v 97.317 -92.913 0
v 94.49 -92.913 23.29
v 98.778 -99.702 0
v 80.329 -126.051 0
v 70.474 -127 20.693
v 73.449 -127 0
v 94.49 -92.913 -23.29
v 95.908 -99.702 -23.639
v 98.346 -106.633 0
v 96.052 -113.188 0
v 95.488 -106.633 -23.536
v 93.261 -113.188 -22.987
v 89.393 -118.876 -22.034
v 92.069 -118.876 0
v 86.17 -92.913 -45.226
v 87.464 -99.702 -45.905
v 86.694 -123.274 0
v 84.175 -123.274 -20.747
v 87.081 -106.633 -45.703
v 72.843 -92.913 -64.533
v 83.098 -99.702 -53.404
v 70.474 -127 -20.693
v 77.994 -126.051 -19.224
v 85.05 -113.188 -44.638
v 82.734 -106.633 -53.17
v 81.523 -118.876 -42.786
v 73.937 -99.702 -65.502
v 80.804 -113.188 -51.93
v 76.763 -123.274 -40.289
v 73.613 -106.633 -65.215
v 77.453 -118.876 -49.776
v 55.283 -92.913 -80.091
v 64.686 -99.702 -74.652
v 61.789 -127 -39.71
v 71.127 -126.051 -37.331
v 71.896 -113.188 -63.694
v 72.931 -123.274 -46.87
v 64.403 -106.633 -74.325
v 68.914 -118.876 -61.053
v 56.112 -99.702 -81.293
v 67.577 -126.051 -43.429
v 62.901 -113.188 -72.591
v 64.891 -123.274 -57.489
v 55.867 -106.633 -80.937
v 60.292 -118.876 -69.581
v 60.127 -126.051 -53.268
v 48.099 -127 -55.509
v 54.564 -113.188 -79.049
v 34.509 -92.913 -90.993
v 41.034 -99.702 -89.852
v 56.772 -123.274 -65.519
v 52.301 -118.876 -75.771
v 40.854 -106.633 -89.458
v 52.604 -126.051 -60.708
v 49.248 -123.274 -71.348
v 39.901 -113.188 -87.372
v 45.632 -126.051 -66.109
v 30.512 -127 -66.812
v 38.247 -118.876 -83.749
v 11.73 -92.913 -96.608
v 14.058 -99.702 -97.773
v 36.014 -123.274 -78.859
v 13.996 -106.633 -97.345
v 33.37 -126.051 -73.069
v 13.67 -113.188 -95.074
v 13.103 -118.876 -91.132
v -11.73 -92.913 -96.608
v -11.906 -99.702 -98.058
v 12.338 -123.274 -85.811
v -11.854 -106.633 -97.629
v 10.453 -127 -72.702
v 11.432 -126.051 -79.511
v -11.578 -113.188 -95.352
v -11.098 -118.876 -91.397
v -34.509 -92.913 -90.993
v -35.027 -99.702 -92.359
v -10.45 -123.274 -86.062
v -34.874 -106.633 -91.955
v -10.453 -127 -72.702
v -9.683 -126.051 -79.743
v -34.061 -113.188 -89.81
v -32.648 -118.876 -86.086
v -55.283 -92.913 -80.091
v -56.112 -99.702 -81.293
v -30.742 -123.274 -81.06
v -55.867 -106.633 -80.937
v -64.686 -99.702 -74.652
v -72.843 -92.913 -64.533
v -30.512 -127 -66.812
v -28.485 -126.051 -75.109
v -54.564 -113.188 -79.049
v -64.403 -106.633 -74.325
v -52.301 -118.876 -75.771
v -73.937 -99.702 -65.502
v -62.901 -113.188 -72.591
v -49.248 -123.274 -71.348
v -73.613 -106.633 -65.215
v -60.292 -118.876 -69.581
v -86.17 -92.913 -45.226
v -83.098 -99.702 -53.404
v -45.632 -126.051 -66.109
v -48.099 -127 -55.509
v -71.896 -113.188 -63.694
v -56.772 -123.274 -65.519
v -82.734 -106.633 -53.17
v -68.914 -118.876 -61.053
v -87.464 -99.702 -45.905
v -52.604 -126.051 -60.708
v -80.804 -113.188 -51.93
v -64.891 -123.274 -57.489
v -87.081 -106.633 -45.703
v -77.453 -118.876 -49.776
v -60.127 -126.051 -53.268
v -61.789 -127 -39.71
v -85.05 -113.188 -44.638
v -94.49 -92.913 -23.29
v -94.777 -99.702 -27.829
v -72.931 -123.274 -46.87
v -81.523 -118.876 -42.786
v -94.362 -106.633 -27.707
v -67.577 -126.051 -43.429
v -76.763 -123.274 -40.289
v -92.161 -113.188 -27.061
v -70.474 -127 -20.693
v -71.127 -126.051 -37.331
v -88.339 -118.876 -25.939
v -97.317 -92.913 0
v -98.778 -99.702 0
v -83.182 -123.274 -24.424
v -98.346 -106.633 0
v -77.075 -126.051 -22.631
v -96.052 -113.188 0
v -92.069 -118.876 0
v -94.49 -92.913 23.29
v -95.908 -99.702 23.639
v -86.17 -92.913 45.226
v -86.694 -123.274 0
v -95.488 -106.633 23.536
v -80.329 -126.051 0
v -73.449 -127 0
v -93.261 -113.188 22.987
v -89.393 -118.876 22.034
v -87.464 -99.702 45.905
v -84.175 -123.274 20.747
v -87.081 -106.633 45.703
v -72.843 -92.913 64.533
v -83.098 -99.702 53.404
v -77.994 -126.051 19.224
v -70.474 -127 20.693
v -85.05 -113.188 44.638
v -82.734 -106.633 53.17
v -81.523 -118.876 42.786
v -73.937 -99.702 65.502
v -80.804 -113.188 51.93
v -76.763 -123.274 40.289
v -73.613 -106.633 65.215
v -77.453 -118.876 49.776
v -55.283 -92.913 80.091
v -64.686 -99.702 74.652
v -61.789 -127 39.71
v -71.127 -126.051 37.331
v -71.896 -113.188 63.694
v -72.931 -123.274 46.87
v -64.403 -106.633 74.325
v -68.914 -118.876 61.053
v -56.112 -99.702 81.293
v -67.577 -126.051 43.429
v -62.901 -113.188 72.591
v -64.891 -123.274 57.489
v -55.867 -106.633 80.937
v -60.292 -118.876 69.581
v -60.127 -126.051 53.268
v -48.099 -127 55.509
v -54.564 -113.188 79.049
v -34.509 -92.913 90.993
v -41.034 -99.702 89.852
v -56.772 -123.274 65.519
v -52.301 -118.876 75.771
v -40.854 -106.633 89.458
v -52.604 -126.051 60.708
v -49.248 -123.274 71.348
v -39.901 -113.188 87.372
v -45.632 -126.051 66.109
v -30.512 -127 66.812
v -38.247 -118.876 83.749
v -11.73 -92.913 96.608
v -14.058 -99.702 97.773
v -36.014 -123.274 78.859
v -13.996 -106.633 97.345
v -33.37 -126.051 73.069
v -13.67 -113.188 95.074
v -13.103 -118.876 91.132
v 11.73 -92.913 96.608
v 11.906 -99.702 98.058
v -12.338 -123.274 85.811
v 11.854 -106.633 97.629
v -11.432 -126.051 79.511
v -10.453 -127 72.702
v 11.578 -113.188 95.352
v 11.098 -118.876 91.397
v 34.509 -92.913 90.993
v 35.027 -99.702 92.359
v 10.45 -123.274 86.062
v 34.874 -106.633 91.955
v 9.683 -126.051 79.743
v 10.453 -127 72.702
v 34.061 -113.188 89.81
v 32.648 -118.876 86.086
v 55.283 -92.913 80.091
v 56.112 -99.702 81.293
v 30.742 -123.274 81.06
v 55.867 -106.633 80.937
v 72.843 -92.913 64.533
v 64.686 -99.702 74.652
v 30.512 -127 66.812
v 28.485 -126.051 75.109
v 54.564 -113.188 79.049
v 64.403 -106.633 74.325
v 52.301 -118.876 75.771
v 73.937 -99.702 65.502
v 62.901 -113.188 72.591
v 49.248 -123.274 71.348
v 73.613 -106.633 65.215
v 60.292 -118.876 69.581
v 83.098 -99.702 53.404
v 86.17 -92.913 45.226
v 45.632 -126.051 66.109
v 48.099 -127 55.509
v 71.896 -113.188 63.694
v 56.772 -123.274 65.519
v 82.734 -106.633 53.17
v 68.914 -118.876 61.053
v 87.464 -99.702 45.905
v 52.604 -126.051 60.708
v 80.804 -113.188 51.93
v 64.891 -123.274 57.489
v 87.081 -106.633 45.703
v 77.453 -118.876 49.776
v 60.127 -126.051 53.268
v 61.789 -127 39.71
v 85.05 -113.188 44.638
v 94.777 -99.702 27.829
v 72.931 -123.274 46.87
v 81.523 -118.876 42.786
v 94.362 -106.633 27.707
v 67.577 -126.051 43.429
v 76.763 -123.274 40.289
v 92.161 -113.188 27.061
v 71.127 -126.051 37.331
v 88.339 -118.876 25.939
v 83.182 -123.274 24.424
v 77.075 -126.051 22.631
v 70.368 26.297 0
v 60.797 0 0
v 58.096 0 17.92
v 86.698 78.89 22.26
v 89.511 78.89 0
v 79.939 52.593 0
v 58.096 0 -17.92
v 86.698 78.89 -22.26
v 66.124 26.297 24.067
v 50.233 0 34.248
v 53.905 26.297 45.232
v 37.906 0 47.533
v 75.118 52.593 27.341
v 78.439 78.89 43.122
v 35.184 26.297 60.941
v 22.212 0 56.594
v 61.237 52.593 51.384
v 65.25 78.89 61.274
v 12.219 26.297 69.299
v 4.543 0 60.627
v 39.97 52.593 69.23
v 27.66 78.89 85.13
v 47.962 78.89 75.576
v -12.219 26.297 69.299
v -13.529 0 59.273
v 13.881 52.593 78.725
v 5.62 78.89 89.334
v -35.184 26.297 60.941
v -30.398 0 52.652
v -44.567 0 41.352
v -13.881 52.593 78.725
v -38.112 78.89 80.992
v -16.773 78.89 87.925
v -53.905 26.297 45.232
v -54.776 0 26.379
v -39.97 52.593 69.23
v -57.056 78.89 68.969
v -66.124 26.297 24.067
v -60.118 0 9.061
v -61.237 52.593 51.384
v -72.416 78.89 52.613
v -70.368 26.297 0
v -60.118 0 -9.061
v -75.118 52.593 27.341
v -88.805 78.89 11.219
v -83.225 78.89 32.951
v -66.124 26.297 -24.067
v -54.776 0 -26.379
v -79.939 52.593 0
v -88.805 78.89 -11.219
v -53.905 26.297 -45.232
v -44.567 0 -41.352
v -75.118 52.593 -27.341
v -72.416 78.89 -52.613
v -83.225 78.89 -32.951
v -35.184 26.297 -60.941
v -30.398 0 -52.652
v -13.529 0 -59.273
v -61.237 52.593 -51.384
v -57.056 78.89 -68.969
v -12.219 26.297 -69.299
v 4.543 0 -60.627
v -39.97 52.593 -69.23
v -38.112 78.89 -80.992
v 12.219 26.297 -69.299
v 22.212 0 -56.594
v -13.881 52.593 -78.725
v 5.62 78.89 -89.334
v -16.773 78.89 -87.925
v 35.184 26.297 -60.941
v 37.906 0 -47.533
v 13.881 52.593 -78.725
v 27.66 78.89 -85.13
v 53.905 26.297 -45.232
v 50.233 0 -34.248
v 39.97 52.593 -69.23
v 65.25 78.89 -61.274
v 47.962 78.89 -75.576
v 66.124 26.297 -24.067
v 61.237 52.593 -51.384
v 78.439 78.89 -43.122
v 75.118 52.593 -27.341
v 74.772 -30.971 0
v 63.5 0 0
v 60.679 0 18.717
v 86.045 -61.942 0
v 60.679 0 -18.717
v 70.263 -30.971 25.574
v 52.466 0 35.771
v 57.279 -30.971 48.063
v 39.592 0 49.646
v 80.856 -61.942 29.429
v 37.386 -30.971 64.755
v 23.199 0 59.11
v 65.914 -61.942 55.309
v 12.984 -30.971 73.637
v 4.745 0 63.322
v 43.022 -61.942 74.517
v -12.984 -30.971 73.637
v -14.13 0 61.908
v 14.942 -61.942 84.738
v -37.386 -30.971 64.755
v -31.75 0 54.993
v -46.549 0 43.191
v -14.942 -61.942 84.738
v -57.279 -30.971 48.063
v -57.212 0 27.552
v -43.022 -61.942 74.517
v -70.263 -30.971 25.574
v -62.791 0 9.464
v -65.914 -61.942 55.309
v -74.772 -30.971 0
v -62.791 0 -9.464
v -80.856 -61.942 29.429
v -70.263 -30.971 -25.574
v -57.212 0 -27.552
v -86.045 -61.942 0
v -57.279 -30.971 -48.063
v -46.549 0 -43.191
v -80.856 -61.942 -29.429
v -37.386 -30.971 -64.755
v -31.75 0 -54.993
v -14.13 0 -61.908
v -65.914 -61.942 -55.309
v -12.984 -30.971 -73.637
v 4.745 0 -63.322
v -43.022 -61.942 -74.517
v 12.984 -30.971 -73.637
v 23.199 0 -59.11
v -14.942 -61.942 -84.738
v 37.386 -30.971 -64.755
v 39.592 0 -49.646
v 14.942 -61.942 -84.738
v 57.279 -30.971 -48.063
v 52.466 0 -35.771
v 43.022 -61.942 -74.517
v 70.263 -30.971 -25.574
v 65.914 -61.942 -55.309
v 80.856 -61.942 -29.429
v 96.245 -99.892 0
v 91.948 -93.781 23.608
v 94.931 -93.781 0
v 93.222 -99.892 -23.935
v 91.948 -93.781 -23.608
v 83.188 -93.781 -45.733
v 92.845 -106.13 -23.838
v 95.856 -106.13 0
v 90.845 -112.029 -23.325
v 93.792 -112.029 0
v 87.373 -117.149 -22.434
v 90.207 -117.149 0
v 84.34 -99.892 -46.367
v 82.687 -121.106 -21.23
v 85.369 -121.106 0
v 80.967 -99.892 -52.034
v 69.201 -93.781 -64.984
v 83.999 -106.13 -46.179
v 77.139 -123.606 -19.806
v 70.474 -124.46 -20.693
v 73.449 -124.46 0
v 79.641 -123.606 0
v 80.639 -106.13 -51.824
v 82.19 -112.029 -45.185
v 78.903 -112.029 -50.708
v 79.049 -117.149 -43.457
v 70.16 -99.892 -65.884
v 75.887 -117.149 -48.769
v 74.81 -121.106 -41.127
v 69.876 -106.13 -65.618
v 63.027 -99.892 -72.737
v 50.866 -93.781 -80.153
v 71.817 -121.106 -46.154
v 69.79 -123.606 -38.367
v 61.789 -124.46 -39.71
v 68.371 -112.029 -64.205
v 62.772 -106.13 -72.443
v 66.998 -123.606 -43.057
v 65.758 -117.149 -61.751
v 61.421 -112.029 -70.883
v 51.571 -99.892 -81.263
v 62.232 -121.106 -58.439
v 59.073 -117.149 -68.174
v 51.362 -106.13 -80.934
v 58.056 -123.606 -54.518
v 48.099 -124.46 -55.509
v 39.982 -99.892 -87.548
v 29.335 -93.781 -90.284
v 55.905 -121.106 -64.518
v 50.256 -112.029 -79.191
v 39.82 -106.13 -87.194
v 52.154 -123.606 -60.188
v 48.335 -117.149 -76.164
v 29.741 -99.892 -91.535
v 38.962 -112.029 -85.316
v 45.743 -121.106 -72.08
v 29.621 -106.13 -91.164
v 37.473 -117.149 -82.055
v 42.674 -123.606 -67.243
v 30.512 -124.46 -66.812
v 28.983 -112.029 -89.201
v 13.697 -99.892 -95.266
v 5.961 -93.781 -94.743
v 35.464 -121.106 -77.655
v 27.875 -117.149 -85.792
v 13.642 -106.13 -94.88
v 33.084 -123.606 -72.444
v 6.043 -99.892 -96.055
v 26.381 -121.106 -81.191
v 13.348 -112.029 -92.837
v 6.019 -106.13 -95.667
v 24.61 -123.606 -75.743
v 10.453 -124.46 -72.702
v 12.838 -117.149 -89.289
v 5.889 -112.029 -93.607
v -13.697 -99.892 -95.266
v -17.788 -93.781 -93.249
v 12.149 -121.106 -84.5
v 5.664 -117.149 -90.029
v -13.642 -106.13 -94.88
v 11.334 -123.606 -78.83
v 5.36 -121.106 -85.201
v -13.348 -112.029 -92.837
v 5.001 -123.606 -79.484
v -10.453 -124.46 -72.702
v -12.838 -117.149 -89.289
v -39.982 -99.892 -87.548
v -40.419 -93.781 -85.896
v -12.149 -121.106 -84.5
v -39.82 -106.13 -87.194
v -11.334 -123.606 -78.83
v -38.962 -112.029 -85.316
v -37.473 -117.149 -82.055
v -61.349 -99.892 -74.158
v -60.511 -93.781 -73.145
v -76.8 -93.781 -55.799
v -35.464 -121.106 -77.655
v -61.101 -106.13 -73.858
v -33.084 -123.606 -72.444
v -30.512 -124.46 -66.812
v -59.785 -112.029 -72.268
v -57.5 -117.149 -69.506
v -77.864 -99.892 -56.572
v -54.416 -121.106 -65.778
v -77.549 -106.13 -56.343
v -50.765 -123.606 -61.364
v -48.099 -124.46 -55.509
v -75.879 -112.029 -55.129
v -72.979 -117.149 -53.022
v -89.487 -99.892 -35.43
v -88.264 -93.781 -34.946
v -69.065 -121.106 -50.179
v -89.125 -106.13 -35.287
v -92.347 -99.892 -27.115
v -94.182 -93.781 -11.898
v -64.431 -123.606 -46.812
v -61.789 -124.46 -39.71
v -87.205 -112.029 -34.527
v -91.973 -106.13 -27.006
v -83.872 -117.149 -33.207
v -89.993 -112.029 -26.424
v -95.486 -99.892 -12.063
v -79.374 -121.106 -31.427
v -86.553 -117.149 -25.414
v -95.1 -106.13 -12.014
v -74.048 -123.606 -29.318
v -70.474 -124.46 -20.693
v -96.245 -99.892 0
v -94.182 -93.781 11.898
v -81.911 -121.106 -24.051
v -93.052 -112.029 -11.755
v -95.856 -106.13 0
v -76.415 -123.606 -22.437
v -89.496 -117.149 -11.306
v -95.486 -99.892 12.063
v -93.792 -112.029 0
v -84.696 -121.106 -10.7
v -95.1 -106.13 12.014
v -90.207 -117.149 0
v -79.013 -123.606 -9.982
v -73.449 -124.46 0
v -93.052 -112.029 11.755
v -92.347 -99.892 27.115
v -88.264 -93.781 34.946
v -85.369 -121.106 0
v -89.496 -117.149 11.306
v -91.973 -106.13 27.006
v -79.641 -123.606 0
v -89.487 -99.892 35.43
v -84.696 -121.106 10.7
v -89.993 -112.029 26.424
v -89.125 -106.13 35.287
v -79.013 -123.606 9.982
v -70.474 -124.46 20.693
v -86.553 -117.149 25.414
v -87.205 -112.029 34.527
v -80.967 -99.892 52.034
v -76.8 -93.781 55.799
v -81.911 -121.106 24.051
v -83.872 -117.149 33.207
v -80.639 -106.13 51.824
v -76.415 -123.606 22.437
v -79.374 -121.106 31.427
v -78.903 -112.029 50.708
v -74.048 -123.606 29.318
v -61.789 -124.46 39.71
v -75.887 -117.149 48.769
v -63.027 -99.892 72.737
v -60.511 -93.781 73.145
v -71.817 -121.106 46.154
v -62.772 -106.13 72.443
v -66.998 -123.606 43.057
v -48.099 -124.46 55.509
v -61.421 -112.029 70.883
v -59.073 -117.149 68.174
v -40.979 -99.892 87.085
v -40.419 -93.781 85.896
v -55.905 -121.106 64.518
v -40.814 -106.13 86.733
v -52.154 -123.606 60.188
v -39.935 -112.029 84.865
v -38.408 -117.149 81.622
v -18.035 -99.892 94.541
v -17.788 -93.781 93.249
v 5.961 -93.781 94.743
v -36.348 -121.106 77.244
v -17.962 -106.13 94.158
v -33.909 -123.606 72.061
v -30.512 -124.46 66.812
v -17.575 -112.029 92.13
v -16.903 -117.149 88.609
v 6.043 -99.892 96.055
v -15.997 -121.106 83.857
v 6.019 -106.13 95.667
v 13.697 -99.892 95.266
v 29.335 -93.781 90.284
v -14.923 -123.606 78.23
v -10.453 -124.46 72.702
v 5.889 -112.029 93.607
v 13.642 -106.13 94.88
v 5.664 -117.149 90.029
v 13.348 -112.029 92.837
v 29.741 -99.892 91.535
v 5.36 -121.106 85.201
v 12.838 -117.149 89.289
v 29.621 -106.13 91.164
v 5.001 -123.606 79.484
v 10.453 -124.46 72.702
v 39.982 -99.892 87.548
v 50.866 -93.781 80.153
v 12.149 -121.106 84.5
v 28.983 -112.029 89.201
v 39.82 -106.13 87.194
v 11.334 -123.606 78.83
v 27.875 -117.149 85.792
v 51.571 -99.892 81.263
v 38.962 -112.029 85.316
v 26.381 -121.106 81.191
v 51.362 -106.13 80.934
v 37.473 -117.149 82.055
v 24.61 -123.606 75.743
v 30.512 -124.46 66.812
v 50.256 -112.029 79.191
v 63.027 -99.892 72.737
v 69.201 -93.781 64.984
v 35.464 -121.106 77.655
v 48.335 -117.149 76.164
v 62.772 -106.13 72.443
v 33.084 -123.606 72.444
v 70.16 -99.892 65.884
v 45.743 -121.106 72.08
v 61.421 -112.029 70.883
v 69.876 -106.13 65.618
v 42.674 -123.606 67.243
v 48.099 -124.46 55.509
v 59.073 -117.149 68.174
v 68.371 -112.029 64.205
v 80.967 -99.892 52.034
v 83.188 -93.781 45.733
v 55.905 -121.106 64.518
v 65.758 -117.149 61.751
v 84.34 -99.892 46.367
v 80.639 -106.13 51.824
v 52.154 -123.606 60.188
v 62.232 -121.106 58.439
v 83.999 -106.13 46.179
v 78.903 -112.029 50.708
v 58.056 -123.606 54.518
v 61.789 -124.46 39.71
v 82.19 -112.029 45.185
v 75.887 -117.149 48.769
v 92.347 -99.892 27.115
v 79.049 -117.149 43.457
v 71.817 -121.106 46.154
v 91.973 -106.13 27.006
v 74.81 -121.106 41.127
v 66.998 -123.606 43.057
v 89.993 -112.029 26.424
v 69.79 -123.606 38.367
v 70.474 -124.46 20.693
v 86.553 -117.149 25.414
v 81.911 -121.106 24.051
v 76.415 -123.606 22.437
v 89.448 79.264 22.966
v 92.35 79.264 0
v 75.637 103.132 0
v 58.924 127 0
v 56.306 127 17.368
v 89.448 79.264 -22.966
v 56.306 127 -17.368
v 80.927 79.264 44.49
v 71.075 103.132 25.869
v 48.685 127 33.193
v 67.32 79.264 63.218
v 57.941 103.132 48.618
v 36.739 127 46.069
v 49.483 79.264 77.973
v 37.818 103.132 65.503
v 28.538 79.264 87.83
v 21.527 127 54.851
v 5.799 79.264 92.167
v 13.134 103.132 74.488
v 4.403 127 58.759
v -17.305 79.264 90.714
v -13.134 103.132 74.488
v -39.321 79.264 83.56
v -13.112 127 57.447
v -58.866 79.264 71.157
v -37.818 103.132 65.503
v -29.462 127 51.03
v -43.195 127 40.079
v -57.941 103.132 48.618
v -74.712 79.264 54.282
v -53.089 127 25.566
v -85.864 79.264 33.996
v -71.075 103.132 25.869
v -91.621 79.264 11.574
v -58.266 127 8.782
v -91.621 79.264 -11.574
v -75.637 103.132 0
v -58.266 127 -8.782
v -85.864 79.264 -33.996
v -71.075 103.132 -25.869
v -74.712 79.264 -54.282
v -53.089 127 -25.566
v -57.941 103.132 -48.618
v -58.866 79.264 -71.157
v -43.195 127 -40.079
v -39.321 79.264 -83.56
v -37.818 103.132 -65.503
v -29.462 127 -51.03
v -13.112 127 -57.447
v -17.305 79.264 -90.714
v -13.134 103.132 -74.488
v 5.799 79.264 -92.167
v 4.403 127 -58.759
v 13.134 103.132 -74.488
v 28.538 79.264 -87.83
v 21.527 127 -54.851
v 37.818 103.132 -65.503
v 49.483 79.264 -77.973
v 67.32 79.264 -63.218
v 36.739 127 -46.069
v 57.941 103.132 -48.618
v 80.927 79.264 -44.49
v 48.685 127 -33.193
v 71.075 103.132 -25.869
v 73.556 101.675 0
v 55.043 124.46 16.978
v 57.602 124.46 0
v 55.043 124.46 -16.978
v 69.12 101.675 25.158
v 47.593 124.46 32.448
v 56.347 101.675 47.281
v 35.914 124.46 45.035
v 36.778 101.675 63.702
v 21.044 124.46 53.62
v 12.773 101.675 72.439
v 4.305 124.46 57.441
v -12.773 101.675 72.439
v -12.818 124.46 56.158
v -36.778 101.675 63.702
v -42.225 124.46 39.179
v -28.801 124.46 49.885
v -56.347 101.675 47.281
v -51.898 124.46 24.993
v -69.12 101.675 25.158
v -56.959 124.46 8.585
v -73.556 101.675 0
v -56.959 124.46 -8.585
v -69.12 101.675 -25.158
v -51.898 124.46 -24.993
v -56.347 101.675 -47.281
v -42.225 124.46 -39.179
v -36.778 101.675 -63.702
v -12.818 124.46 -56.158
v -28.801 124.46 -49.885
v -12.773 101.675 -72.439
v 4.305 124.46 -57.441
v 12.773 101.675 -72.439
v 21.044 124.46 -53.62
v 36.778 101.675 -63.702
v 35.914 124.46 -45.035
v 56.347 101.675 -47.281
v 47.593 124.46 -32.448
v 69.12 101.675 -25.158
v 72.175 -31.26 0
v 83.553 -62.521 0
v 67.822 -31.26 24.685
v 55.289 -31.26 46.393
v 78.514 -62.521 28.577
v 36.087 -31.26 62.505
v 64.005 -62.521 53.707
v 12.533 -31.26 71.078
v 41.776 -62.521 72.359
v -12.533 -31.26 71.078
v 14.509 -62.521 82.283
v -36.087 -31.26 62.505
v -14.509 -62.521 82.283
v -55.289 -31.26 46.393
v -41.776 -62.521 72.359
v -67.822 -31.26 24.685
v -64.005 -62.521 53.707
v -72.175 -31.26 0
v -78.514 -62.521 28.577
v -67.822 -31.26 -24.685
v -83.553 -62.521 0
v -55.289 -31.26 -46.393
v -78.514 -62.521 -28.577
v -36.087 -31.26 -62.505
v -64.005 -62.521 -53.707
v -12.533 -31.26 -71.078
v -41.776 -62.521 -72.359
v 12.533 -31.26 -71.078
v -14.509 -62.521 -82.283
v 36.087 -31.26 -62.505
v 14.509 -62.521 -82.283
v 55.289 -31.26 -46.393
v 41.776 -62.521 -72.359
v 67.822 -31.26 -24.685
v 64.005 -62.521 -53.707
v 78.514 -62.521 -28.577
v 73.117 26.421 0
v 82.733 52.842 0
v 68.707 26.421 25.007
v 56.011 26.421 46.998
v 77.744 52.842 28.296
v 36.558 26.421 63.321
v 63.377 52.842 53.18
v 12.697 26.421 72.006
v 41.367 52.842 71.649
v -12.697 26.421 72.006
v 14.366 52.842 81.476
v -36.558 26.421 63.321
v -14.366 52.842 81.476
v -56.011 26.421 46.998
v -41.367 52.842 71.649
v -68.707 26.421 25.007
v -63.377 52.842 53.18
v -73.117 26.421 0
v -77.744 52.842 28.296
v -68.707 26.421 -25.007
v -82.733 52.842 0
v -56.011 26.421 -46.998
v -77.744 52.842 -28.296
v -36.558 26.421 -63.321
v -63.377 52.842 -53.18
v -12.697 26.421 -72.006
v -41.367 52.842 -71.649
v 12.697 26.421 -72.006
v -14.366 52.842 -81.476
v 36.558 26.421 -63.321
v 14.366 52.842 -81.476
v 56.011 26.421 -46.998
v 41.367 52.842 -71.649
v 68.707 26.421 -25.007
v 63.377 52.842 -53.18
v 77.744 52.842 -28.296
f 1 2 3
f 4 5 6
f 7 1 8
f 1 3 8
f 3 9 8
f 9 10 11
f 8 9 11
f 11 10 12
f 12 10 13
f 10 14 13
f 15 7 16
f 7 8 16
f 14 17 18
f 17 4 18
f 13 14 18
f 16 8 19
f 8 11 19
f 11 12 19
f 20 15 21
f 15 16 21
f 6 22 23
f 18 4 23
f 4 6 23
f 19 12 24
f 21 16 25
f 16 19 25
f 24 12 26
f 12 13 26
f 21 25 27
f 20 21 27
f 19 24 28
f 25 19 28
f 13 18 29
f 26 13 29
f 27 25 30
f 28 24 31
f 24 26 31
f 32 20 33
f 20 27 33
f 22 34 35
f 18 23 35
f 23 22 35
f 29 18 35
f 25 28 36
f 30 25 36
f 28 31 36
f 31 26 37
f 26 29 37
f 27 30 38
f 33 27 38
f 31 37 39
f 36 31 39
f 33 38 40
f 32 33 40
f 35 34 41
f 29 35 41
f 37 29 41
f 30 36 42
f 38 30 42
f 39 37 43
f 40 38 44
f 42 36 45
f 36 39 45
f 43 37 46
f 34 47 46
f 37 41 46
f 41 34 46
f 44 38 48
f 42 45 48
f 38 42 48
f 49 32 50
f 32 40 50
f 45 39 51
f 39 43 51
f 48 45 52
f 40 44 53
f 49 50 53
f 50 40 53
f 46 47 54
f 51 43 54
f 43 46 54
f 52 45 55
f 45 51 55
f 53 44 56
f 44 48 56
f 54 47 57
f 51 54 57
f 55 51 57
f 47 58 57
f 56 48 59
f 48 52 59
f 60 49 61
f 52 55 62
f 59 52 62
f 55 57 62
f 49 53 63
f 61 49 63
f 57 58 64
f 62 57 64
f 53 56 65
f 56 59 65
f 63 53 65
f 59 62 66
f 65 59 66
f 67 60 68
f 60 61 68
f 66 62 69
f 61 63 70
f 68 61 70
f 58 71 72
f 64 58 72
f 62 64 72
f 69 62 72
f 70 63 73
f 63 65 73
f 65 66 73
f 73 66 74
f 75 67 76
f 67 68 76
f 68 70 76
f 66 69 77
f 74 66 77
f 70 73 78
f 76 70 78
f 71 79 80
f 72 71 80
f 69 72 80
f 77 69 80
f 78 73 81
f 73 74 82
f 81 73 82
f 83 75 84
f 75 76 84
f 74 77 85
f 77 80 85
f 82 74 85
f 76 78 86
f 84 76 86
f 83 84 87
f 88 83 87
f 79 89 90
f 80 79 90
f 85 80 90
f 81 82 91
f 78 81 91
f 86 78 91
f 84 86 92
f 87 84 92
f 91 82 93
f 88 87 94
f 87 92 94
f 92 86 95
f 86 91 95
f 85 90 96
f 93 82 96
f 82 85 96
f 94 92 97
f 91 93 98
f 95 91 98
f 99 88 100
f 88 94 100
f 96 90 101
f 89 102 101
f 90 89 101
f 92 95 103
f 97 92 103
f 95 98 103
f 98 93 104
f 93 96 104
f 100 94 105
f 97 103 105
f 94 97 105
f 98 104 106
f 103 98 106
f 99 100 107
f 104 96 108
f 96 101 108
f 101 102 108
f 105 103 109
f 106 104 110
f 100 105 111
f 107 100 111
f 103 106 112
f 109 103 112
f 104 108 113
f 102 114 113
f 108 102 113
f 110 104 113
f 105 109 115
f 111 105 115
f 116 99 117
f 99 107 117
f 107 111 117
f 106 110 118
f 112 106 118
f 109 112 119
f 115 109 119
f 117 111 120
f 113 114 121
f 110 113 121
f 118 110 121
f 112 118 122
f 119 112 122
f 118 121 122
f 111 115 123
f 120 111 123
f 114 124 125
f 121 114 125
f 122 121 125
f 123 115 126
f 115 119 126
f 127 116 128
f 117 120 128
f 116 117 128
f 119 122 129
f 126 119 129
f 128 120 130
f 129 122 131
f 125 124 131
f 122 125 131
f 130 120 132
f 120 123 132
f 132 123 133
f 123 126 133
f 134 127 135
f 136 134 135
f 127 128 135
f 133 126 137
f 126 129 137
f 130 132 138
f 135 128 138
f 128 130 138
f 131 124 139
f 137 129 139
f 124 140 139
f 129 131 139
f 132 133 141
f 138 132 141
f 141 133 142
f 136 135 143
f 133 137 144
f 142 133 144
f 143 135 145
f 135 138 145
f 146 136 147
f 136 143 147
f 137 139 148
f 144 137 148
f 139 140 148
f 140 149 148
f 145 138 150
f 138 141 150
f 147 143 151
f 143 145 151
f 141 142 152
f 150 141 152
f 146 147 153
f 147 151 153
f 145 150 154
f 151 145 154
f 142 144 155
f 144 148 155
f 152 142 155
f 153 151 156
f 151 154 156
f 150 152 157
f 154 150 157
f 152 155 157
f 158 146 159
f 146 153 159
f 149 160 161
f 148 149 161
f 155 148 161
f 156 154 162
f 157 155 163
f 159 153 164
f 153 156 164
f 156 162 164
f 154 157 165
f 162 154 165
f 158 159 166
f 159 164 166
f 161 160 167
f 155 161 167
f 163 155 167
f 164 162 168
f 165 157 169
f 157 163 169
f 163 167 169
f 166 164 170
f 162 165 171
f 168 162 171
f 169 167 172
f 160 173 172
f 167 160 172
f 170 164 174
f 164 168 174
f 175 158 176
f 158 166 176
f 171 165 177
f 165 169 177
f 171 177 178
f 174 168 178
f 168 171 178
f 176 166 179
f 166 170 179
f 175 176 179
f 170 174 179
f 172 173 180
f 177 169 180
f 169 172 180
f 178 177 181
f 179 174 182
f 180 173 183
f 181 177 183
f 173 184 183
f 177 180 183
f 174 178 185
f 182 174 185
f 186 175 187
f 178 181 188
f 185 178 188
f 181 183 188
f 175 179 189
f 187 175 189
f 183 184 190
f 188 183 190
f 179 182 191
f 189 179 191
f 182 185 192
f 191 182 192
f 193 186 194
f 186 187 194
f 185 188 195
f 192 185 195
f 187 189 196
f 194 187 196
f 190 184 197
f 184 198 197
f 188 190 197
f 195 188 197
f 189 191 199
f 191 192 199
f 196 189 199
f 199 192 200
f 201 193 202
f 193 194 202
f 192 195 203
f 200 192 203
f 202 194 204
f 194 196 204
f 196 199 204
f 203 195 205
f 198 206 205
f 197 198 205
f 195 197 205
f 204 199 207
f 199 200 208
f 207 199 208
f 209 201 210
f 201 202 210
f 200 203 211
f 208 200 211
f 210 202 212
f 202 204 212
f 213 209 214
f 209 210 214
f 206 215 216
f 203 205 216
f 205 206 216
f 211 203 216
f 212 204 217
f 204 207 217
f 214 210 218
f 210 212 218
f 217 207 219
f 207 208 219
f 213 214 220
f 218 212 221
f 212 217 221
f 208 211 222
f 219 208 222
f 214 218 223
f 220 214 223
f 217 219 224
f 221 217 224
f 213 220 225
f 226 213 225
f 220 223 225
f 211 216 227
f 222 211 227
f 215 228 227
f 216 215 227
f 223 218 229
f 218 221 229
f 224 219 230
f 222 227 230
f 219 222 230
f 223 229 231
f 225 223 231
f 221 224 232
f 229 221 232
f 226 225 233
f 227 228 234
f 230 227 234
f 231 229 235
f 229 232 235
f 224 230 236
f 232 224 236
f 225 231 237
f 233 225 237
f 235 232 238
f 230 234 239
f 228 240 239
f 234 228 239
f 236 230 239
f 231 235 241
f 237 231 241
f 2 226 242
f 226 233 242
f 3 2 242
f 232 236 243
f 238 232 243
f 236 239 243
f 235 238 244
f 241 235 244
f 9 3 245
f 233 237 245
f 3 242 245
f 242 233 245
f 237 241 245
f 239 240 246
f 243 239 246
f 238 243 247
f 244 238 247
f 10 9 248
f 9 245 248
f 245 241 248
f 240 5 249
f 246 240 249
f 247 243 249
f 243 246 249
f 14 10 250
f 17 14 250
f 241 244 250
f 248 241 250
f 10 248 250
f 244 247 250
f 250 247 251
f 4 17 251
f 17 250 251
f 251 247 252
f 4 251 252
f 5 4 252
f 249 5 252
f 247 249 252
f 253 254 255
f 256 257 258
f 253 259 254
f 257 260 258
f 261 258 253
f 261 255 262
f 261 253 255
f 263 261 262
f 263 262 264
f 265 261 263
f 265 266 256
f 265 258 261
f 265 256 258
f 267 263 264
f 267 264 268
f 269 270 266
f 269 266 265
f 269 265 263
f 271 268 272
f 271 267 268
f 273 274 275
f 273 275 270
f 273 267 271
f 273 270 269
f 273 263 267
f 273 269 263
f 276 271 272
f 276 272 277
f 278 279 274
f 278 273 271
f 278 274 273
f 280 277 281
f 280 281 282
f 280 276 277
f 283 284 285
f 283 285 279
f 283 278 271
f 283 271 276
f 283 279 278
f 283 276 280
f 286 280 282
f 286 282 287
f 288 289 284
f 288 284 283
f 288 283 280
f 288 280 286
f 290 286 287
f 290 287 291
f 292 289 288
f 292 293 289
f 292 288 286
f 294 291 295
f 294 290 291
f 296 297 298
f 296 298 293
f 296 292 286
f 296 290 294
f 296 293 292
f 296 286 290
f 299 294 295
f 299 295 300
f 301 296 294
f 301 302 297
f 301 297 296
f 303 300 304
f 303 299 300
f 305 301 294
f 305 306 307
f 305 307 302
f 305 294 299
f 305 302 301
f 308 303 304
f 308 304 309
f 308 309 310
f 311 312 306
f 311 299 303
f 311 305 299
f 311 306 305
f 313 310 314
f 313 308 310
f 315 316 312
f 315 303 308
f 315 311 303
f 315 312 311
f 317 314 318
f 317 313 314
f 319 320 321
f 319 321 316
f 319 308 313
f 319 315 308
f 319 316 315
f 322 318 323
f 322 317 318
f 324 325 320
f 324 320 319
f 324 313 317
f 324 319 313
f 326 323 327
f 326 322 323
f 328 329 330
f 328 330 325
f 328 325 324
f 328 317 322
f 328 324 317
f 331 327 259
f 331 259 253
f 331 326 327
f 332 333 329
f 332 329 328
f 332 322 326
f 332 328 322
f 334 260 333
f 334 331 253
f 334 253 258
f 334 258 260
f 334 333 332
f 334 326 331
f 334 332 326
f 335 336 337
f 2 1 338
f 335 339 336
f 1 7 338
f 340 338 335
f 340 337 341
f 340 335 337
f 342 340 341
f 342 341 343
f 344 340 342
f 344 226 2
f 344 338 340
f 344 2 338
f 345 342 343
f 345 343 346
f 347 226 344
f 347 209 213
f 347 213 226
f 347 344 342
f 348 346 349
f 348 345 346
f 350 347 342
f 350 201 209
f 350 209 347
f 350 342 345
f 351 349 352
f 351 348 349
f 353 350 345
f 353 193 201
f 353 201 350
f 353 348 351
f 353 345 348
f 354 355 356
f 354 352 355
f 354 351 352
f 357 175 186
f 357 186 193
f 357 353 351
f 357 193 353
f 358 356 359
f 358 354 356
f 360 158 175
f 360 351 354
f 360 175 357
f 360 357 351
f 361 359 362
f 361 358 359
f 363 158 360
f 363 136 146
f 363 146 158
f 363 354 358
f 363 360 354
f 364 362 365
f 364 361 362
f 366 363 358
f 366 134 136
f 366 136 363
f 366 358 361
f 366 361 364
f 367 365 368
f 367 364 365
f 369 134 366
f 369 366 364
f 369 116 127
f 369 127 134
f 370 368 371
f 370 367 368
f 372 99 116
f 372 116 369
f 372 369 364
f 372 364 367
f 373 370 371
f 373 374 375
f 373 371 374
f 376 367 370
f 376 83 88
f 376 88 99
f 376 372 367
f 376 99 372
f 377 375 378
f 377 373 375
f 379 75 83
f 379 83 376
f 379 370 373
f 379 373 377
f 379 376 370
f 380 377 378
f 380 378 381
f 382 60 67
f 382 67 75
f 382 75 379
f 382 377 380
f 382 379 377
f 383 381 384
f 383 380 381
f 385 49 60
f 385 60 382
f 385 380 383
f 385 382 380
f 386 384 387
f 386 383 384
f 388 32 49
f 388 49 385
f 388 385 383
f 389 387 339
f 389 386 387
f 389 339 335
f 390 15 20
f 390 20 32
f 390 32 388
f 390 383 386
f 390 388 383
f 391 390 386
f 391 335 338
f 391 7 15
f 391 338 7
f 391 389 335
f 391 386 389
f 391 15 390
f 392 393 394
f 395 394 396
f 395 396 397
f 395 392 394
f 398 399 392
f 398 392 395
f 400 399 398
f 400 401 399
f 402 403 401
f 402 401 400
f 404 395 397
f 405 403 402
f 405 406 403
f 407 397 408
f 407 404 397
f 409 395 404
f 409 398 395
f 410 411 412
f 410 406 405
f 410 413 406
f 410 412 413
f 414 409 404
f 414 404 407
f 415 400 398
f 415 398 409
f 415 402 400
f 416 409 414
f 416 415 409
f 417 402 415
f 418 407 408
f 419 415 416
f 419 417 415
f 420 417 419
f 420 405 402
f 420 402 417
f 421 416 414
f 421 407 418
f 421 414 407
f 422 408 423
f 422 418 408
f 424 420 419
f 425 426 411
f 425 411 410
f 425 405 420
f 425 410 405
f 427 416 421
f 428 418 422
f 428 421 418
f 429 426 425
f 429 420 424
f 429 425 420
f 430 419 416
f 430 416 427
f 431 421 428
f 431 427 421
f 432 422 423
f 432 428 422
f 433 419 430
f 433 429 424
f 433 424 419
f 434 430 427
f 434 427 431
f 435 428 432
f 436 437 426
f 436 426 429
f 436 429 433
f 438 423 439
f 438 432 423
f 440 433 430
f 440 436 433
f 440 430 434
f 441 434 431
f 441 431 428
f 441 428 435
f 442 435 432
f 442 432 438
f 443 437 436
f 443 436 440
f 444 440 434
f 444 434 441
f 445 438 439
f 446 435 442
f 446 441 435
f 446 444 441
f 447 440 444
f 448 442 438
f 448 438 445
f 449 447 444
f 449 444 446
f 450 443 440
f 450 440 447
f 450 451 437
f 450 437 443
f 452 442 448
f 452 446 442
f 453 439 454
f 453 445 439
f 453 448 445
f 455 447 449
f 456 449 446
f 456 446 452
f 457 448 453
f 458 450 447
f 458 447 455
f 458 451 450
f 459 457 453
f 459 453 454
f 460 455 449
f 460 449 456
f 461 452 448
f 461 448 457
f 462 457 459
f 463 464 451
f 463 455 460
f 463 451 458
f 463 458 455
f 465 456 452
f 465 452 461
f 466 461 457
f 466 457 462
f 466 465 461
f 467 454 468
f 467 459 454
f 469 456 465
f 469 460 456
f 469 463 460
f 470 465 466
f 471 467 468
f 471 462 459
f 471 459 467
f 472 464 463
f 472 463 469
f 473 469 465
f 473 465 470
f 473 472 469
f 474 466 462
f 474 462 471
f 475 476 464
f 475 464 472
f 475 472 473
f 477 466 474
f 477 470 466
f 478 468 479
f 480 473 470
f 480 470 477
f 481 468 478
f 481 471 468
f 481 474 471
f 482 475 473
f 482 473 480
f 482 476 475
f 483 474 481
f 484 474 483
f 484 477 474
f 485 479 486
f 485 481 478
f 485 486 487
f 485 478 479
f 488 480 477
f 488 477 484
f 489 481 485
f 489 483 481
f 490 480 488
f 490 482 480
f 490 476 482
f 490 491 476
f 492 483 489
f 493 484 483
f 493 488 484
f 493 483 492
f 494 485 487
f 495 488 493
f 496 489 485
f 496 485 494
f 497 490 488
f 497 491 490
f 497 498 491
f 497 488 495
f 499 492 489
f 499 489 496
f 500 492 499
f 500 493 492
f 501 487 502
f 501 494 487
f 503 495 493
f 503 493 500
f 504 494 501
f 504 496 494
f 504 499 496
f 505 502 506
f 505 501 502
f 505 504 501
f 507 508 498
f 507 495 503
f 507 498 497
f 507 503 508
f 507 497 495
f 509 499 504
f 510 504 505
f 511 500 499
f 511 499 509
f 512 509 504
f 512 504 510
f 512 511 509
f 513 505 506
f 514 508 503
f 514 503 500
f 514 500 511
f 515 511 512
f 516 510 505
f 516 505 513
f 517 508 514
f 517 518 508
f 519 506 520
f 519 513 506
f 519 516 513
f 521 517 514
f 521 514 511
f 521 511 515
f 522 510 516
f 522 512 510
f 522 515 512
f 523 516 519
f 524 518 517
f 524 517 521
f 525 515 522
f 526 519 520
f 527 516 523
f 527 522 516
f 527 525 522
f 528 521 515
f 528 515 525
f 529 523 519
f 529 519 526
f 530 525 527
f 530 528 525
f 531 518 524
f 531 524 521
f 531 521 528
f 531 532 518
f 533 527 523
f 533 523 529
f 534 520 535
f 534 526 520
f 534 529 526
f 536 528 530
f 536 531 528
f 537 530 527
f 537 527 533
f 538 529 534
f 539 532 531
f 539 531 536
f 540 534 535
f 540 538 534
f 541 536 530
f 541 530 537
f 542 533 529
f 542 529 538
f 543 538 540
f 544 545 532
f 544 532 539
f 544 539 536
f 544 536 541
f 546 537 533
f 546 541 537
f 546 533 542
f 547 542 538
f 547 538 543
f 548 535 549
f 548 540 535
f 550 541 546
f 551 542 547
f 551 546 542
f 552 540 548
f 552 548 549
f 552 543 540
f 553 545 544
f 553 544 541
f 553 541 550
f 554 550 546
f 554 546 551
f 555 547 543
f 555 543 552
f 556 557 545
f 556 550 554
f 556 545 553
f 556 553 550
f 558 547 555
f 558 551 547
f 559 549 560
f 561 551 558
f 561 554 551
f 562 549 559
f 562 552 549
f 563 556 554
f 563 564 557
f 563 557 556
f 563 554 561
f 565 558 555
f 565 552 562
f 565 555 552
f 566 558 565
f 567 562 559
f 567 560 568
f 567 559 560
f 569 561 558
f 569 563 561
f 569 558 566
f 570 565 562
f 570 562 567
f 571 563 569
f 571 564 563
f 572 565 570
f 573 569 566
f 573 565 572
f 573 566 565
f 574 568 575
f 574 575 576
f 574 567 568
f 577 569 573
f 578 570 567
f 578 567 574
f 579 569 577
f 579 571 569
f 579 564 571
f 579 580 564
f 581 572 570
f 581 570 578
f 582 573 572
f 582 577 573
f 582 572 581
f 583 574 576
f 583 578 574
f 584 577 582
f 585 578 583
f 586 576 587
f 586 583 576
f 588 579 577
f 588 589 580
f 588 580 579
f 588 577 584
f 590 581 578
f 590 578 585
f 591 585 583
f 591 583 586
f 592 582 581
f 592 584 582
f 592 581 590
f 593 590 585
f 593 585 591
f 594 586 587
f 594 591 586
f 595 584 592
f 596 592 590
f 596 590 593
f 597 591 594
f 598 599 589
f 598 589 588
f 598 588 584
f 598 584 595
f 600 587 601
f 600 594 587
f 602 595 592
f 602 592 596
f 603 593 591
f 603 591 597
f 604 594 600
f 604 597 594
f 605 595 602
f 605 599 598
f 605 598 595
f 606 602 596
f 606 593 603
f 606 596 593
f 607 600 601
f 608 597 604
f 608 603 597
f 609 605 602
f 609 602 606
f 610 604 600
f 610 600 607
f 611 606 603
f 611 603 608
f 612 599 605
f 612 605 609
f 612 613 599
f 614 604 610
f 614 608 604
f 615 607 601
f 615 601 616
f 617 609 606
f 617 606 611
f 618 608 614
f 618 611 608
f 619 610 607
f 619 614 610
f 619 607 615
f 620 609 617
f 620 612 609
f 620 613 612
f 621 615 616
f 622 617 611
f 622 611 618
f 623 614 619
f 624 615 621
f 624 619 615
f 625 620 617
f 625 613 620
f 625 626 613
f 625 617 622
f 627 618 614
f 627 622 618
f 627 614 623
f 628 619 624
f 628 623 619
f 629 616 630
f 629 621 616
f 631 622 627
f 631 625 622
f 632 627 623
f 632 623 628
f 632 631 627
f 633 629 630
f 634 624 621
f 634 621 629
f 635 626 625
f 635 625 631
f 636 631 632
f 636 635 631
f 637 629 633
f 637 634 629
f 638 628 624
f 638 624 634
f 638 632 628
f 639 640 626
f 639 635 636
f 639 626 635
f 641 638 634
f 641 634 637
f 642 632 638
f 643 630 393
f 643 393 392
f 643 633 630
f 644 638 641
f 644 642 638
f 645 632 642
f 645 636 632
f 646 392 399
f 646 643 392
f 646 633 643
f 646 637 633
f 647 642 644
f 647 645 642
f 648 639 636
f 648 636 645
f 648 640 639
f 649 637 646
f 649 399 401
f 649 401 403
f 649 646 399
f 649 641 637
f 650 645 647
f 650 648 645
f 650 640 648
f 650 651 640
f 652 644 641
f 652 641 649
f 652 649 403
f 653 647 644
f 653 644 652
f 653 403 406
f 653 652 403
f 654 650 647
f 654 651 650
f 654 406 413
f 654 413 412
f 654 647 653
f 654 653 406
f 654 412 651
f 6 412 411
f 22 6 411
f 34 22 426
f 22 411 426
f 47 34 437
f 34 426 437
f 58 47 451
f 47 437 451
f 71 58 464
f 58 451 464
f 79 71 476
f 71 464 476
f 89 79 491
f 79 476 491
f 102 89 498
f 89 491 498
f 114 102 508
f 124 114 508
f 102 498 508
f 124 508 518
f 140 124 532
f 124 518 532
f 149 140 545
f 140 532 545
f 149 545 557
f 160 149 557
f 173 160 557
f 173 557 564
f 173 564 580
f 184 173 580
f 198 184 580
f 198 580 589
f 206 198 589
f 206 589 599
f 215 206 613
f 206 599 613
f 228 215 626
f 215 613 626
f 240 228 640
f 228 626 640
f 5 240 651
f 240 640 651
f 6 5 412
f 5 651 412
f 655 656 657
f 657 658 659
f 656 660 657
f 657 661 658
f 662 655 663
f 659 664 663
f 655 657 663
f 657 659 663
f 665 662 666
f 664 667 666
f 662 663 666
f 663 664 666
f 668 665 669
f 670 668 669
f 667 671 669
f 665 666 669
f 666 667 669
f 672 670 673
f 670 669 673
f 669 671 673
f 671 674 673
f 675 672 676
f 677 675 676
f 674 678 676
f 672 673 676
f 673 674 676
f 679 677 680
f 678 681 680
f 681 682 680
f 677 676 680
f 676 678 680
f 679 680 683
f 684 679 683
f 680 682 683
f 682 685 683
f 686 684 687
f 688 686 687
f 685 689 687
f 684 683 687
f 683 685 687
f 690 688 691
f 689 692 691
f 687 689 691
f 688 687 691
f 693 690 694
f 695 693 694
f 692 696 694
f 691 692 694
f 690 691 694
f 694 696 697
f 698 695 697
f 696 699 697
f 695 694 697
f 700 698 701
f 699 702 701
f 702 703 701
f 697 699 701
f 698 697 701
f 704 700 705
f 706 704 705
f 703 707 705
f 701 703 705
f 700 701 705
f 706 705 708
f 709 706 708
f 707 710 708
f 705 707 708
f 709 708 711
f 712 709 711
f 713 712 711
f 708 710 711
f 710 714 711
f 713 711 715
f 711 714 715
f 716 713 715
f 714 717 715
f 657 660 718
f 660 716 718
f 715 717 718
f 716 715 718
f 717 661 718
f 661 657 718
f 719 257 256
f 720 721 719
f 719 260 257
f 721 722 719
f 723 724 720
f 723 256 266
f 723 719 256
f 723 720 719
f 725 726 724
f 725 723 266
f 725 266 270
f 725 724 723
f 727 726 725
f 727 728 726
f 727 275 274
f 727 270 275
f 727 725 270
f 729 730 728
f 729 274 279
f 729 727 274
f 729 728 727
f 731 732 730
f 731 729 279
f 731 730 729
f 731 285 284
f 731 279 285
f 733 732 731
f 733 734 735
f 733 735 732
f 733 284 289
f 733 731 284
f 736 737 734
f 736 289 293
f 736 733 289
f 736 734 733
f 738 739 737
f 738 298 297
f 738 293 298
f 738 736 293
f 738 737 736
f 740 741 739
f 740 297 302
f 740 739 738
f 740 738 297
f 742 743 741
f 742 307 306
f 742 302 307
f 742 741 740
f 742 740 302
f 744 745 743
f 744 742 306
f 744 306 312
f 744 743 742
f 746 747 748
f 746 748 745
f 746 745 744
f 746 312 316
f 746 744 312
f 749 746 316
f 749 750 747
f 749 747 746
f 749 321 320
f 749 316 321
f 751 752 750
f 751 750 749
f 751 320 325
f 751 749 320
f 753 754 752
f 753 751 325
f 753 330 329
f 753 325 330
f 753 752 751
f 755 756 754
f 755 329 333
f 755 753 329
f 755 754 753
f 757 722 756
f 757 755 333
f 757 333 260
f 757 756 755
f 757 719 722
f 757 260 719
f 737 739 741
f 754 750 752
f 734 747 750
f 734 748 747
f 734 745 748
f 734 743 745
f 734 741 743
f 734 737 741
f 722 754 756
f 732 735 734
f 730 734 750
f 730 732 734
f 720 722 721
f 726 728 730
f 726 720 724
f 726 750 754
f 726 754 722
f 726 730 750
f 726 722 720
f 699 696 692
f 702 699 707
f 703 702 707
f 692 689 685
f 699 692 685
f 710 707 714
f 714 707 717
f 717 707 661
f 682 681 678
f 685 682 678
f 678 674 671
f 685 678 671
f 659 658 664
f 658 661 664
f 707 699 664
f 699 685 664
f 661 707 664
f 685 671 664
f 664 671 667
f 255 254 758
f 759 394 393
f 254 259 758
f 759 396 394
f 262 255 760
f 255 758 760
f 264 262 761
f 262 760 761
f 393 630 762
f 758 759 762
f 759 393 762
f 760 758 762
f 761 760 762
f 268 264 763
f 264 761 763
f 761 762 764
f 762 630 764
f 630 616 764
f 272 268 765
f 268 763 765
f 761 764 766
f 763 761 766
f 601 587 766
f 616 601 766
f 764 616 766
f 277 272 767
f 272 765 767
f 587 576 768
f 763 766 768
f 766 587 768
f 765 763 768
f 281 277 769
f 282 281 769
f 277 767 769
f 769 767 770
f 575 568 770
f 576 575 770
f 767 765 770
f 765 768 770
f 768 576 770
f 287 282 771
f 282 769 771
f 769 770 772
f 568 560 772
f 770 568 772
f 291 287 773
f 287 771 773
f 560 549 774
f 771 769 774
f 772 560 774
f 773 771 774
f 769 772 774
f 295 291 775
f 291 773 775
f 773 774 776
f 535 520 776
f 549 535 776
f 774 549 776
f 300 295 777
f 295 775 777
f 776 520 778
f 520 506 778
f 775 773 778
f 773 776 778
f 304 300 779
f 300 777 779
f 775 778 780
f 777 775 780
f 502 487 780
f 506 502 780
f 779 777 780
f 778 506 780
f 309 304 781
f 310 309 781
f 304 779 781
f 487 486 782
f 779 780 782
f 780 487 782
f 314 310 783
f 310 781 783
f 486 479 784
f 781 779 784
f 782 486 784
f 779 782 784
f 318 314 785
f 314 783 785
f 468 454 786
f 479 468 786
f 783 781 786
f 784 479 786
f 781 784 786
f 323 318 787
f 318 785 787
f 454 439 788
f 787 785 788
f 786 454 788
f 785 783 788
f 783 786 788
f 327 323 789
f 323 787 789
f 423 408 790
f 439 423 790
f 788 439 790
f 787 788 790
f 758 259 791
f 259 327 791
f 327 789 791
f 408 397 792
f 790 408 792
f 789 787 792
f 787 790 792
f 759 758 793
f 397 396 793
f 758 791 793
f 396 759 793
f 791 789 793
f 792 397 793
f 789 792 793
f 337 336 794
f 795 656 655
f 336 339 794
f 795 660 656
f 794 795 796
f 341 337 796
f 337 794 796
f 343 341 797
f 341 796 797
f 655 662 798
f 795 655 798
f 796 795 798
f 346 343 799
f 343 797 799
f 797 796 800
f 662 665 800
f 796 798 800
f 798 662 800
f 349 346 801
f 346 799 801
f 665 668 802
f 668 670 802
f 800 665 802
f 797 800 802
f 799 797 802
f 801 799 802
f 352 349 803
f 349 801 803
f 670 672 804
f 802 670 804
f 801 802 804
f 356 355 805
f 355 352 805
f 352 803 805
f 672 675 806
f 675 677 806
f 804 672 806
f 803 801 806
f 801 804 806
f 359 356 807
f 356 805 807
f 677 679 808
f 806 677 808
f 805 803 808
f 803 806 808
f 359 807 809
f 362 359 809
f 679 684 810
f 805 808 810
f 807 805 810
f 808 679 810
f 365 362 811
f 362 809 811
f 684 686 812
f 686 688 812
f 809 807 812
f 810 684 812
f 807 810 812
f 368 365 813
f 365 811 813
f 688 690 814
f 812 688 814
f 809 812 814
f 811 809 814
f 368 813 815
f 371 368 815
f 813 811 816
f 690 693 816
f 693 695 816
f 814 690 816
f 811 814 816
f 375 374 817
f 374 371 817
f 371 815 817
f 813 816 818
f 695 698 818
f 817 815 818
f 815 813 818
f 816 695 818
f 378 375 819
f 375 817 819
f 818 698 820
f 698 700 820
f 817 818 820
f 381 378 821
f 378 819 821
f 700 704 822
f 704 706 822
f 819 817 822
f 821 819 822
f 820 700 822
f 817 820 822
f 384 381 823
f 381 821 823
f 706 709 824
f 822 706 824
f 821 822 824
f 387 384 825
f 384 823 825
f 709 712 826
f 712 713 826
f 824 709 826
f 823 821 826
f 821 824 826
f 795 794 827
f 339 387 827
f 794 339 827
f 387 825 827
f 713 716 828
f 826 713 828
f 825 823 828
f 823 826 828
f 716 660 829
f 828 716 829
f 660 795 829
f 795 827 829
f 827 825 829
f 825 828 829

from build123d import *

# Parameters (mm, degrees)
F0_R     = 63.5
F1_DEPTH = 127
F1_TAPER = -20
F2_SIZE  = 50.8
F3_R     = 25.4
F4_T     = -2.54


# Not quite as in the source:
# - a shell that OpenCascade refuses in one call is made with other operations: the cavity is built on its own and cut out


with BuildPart() as f1:
    # F0 (on Front) → F1 (new body, symmetric)
    with BuildSketch(Plane.XZ):
        Circle(F0_R)
    extrude(amount=F1_DEPTH, both=True, taper=F1_TAPER)

    # F2
    f2_edges = [f1.edges().sort_by_distance(p)[0] for p in [
        (-109.72422, 127, 0),
    ]]
    chamfer(f2_edges, length=F2_SIZE)

    # F3
    f3_edges = [f1.edges().sort_by_distance(p)[0] for p in [
        (-109.72422, -127, 0),
    ]]
    fillet(f3_edges, radius=F3_R)

    # F4: a shell. OpenCascade refuses it in one call, so the cavity is built on its own and cut out:
    # the body offset inwards by the wall thickness, plus a prism from it out through each open face.
    f4_core = offset(f1.part, amount=F4_T, kind=Kind.INTERSECTION, mode=Mode.PRIVATE)
    f4_exits = [f4_core.faces().sort_by_distance(p)[0] for p in [
        (0, -124.46, 0),
    ]]
    add(f4_core, mode=Mode.SUBTRACT)
    extrude(f4_exits, amount=-F4_T, mode=Mode.SUBTRACT)


solid = f1.part
